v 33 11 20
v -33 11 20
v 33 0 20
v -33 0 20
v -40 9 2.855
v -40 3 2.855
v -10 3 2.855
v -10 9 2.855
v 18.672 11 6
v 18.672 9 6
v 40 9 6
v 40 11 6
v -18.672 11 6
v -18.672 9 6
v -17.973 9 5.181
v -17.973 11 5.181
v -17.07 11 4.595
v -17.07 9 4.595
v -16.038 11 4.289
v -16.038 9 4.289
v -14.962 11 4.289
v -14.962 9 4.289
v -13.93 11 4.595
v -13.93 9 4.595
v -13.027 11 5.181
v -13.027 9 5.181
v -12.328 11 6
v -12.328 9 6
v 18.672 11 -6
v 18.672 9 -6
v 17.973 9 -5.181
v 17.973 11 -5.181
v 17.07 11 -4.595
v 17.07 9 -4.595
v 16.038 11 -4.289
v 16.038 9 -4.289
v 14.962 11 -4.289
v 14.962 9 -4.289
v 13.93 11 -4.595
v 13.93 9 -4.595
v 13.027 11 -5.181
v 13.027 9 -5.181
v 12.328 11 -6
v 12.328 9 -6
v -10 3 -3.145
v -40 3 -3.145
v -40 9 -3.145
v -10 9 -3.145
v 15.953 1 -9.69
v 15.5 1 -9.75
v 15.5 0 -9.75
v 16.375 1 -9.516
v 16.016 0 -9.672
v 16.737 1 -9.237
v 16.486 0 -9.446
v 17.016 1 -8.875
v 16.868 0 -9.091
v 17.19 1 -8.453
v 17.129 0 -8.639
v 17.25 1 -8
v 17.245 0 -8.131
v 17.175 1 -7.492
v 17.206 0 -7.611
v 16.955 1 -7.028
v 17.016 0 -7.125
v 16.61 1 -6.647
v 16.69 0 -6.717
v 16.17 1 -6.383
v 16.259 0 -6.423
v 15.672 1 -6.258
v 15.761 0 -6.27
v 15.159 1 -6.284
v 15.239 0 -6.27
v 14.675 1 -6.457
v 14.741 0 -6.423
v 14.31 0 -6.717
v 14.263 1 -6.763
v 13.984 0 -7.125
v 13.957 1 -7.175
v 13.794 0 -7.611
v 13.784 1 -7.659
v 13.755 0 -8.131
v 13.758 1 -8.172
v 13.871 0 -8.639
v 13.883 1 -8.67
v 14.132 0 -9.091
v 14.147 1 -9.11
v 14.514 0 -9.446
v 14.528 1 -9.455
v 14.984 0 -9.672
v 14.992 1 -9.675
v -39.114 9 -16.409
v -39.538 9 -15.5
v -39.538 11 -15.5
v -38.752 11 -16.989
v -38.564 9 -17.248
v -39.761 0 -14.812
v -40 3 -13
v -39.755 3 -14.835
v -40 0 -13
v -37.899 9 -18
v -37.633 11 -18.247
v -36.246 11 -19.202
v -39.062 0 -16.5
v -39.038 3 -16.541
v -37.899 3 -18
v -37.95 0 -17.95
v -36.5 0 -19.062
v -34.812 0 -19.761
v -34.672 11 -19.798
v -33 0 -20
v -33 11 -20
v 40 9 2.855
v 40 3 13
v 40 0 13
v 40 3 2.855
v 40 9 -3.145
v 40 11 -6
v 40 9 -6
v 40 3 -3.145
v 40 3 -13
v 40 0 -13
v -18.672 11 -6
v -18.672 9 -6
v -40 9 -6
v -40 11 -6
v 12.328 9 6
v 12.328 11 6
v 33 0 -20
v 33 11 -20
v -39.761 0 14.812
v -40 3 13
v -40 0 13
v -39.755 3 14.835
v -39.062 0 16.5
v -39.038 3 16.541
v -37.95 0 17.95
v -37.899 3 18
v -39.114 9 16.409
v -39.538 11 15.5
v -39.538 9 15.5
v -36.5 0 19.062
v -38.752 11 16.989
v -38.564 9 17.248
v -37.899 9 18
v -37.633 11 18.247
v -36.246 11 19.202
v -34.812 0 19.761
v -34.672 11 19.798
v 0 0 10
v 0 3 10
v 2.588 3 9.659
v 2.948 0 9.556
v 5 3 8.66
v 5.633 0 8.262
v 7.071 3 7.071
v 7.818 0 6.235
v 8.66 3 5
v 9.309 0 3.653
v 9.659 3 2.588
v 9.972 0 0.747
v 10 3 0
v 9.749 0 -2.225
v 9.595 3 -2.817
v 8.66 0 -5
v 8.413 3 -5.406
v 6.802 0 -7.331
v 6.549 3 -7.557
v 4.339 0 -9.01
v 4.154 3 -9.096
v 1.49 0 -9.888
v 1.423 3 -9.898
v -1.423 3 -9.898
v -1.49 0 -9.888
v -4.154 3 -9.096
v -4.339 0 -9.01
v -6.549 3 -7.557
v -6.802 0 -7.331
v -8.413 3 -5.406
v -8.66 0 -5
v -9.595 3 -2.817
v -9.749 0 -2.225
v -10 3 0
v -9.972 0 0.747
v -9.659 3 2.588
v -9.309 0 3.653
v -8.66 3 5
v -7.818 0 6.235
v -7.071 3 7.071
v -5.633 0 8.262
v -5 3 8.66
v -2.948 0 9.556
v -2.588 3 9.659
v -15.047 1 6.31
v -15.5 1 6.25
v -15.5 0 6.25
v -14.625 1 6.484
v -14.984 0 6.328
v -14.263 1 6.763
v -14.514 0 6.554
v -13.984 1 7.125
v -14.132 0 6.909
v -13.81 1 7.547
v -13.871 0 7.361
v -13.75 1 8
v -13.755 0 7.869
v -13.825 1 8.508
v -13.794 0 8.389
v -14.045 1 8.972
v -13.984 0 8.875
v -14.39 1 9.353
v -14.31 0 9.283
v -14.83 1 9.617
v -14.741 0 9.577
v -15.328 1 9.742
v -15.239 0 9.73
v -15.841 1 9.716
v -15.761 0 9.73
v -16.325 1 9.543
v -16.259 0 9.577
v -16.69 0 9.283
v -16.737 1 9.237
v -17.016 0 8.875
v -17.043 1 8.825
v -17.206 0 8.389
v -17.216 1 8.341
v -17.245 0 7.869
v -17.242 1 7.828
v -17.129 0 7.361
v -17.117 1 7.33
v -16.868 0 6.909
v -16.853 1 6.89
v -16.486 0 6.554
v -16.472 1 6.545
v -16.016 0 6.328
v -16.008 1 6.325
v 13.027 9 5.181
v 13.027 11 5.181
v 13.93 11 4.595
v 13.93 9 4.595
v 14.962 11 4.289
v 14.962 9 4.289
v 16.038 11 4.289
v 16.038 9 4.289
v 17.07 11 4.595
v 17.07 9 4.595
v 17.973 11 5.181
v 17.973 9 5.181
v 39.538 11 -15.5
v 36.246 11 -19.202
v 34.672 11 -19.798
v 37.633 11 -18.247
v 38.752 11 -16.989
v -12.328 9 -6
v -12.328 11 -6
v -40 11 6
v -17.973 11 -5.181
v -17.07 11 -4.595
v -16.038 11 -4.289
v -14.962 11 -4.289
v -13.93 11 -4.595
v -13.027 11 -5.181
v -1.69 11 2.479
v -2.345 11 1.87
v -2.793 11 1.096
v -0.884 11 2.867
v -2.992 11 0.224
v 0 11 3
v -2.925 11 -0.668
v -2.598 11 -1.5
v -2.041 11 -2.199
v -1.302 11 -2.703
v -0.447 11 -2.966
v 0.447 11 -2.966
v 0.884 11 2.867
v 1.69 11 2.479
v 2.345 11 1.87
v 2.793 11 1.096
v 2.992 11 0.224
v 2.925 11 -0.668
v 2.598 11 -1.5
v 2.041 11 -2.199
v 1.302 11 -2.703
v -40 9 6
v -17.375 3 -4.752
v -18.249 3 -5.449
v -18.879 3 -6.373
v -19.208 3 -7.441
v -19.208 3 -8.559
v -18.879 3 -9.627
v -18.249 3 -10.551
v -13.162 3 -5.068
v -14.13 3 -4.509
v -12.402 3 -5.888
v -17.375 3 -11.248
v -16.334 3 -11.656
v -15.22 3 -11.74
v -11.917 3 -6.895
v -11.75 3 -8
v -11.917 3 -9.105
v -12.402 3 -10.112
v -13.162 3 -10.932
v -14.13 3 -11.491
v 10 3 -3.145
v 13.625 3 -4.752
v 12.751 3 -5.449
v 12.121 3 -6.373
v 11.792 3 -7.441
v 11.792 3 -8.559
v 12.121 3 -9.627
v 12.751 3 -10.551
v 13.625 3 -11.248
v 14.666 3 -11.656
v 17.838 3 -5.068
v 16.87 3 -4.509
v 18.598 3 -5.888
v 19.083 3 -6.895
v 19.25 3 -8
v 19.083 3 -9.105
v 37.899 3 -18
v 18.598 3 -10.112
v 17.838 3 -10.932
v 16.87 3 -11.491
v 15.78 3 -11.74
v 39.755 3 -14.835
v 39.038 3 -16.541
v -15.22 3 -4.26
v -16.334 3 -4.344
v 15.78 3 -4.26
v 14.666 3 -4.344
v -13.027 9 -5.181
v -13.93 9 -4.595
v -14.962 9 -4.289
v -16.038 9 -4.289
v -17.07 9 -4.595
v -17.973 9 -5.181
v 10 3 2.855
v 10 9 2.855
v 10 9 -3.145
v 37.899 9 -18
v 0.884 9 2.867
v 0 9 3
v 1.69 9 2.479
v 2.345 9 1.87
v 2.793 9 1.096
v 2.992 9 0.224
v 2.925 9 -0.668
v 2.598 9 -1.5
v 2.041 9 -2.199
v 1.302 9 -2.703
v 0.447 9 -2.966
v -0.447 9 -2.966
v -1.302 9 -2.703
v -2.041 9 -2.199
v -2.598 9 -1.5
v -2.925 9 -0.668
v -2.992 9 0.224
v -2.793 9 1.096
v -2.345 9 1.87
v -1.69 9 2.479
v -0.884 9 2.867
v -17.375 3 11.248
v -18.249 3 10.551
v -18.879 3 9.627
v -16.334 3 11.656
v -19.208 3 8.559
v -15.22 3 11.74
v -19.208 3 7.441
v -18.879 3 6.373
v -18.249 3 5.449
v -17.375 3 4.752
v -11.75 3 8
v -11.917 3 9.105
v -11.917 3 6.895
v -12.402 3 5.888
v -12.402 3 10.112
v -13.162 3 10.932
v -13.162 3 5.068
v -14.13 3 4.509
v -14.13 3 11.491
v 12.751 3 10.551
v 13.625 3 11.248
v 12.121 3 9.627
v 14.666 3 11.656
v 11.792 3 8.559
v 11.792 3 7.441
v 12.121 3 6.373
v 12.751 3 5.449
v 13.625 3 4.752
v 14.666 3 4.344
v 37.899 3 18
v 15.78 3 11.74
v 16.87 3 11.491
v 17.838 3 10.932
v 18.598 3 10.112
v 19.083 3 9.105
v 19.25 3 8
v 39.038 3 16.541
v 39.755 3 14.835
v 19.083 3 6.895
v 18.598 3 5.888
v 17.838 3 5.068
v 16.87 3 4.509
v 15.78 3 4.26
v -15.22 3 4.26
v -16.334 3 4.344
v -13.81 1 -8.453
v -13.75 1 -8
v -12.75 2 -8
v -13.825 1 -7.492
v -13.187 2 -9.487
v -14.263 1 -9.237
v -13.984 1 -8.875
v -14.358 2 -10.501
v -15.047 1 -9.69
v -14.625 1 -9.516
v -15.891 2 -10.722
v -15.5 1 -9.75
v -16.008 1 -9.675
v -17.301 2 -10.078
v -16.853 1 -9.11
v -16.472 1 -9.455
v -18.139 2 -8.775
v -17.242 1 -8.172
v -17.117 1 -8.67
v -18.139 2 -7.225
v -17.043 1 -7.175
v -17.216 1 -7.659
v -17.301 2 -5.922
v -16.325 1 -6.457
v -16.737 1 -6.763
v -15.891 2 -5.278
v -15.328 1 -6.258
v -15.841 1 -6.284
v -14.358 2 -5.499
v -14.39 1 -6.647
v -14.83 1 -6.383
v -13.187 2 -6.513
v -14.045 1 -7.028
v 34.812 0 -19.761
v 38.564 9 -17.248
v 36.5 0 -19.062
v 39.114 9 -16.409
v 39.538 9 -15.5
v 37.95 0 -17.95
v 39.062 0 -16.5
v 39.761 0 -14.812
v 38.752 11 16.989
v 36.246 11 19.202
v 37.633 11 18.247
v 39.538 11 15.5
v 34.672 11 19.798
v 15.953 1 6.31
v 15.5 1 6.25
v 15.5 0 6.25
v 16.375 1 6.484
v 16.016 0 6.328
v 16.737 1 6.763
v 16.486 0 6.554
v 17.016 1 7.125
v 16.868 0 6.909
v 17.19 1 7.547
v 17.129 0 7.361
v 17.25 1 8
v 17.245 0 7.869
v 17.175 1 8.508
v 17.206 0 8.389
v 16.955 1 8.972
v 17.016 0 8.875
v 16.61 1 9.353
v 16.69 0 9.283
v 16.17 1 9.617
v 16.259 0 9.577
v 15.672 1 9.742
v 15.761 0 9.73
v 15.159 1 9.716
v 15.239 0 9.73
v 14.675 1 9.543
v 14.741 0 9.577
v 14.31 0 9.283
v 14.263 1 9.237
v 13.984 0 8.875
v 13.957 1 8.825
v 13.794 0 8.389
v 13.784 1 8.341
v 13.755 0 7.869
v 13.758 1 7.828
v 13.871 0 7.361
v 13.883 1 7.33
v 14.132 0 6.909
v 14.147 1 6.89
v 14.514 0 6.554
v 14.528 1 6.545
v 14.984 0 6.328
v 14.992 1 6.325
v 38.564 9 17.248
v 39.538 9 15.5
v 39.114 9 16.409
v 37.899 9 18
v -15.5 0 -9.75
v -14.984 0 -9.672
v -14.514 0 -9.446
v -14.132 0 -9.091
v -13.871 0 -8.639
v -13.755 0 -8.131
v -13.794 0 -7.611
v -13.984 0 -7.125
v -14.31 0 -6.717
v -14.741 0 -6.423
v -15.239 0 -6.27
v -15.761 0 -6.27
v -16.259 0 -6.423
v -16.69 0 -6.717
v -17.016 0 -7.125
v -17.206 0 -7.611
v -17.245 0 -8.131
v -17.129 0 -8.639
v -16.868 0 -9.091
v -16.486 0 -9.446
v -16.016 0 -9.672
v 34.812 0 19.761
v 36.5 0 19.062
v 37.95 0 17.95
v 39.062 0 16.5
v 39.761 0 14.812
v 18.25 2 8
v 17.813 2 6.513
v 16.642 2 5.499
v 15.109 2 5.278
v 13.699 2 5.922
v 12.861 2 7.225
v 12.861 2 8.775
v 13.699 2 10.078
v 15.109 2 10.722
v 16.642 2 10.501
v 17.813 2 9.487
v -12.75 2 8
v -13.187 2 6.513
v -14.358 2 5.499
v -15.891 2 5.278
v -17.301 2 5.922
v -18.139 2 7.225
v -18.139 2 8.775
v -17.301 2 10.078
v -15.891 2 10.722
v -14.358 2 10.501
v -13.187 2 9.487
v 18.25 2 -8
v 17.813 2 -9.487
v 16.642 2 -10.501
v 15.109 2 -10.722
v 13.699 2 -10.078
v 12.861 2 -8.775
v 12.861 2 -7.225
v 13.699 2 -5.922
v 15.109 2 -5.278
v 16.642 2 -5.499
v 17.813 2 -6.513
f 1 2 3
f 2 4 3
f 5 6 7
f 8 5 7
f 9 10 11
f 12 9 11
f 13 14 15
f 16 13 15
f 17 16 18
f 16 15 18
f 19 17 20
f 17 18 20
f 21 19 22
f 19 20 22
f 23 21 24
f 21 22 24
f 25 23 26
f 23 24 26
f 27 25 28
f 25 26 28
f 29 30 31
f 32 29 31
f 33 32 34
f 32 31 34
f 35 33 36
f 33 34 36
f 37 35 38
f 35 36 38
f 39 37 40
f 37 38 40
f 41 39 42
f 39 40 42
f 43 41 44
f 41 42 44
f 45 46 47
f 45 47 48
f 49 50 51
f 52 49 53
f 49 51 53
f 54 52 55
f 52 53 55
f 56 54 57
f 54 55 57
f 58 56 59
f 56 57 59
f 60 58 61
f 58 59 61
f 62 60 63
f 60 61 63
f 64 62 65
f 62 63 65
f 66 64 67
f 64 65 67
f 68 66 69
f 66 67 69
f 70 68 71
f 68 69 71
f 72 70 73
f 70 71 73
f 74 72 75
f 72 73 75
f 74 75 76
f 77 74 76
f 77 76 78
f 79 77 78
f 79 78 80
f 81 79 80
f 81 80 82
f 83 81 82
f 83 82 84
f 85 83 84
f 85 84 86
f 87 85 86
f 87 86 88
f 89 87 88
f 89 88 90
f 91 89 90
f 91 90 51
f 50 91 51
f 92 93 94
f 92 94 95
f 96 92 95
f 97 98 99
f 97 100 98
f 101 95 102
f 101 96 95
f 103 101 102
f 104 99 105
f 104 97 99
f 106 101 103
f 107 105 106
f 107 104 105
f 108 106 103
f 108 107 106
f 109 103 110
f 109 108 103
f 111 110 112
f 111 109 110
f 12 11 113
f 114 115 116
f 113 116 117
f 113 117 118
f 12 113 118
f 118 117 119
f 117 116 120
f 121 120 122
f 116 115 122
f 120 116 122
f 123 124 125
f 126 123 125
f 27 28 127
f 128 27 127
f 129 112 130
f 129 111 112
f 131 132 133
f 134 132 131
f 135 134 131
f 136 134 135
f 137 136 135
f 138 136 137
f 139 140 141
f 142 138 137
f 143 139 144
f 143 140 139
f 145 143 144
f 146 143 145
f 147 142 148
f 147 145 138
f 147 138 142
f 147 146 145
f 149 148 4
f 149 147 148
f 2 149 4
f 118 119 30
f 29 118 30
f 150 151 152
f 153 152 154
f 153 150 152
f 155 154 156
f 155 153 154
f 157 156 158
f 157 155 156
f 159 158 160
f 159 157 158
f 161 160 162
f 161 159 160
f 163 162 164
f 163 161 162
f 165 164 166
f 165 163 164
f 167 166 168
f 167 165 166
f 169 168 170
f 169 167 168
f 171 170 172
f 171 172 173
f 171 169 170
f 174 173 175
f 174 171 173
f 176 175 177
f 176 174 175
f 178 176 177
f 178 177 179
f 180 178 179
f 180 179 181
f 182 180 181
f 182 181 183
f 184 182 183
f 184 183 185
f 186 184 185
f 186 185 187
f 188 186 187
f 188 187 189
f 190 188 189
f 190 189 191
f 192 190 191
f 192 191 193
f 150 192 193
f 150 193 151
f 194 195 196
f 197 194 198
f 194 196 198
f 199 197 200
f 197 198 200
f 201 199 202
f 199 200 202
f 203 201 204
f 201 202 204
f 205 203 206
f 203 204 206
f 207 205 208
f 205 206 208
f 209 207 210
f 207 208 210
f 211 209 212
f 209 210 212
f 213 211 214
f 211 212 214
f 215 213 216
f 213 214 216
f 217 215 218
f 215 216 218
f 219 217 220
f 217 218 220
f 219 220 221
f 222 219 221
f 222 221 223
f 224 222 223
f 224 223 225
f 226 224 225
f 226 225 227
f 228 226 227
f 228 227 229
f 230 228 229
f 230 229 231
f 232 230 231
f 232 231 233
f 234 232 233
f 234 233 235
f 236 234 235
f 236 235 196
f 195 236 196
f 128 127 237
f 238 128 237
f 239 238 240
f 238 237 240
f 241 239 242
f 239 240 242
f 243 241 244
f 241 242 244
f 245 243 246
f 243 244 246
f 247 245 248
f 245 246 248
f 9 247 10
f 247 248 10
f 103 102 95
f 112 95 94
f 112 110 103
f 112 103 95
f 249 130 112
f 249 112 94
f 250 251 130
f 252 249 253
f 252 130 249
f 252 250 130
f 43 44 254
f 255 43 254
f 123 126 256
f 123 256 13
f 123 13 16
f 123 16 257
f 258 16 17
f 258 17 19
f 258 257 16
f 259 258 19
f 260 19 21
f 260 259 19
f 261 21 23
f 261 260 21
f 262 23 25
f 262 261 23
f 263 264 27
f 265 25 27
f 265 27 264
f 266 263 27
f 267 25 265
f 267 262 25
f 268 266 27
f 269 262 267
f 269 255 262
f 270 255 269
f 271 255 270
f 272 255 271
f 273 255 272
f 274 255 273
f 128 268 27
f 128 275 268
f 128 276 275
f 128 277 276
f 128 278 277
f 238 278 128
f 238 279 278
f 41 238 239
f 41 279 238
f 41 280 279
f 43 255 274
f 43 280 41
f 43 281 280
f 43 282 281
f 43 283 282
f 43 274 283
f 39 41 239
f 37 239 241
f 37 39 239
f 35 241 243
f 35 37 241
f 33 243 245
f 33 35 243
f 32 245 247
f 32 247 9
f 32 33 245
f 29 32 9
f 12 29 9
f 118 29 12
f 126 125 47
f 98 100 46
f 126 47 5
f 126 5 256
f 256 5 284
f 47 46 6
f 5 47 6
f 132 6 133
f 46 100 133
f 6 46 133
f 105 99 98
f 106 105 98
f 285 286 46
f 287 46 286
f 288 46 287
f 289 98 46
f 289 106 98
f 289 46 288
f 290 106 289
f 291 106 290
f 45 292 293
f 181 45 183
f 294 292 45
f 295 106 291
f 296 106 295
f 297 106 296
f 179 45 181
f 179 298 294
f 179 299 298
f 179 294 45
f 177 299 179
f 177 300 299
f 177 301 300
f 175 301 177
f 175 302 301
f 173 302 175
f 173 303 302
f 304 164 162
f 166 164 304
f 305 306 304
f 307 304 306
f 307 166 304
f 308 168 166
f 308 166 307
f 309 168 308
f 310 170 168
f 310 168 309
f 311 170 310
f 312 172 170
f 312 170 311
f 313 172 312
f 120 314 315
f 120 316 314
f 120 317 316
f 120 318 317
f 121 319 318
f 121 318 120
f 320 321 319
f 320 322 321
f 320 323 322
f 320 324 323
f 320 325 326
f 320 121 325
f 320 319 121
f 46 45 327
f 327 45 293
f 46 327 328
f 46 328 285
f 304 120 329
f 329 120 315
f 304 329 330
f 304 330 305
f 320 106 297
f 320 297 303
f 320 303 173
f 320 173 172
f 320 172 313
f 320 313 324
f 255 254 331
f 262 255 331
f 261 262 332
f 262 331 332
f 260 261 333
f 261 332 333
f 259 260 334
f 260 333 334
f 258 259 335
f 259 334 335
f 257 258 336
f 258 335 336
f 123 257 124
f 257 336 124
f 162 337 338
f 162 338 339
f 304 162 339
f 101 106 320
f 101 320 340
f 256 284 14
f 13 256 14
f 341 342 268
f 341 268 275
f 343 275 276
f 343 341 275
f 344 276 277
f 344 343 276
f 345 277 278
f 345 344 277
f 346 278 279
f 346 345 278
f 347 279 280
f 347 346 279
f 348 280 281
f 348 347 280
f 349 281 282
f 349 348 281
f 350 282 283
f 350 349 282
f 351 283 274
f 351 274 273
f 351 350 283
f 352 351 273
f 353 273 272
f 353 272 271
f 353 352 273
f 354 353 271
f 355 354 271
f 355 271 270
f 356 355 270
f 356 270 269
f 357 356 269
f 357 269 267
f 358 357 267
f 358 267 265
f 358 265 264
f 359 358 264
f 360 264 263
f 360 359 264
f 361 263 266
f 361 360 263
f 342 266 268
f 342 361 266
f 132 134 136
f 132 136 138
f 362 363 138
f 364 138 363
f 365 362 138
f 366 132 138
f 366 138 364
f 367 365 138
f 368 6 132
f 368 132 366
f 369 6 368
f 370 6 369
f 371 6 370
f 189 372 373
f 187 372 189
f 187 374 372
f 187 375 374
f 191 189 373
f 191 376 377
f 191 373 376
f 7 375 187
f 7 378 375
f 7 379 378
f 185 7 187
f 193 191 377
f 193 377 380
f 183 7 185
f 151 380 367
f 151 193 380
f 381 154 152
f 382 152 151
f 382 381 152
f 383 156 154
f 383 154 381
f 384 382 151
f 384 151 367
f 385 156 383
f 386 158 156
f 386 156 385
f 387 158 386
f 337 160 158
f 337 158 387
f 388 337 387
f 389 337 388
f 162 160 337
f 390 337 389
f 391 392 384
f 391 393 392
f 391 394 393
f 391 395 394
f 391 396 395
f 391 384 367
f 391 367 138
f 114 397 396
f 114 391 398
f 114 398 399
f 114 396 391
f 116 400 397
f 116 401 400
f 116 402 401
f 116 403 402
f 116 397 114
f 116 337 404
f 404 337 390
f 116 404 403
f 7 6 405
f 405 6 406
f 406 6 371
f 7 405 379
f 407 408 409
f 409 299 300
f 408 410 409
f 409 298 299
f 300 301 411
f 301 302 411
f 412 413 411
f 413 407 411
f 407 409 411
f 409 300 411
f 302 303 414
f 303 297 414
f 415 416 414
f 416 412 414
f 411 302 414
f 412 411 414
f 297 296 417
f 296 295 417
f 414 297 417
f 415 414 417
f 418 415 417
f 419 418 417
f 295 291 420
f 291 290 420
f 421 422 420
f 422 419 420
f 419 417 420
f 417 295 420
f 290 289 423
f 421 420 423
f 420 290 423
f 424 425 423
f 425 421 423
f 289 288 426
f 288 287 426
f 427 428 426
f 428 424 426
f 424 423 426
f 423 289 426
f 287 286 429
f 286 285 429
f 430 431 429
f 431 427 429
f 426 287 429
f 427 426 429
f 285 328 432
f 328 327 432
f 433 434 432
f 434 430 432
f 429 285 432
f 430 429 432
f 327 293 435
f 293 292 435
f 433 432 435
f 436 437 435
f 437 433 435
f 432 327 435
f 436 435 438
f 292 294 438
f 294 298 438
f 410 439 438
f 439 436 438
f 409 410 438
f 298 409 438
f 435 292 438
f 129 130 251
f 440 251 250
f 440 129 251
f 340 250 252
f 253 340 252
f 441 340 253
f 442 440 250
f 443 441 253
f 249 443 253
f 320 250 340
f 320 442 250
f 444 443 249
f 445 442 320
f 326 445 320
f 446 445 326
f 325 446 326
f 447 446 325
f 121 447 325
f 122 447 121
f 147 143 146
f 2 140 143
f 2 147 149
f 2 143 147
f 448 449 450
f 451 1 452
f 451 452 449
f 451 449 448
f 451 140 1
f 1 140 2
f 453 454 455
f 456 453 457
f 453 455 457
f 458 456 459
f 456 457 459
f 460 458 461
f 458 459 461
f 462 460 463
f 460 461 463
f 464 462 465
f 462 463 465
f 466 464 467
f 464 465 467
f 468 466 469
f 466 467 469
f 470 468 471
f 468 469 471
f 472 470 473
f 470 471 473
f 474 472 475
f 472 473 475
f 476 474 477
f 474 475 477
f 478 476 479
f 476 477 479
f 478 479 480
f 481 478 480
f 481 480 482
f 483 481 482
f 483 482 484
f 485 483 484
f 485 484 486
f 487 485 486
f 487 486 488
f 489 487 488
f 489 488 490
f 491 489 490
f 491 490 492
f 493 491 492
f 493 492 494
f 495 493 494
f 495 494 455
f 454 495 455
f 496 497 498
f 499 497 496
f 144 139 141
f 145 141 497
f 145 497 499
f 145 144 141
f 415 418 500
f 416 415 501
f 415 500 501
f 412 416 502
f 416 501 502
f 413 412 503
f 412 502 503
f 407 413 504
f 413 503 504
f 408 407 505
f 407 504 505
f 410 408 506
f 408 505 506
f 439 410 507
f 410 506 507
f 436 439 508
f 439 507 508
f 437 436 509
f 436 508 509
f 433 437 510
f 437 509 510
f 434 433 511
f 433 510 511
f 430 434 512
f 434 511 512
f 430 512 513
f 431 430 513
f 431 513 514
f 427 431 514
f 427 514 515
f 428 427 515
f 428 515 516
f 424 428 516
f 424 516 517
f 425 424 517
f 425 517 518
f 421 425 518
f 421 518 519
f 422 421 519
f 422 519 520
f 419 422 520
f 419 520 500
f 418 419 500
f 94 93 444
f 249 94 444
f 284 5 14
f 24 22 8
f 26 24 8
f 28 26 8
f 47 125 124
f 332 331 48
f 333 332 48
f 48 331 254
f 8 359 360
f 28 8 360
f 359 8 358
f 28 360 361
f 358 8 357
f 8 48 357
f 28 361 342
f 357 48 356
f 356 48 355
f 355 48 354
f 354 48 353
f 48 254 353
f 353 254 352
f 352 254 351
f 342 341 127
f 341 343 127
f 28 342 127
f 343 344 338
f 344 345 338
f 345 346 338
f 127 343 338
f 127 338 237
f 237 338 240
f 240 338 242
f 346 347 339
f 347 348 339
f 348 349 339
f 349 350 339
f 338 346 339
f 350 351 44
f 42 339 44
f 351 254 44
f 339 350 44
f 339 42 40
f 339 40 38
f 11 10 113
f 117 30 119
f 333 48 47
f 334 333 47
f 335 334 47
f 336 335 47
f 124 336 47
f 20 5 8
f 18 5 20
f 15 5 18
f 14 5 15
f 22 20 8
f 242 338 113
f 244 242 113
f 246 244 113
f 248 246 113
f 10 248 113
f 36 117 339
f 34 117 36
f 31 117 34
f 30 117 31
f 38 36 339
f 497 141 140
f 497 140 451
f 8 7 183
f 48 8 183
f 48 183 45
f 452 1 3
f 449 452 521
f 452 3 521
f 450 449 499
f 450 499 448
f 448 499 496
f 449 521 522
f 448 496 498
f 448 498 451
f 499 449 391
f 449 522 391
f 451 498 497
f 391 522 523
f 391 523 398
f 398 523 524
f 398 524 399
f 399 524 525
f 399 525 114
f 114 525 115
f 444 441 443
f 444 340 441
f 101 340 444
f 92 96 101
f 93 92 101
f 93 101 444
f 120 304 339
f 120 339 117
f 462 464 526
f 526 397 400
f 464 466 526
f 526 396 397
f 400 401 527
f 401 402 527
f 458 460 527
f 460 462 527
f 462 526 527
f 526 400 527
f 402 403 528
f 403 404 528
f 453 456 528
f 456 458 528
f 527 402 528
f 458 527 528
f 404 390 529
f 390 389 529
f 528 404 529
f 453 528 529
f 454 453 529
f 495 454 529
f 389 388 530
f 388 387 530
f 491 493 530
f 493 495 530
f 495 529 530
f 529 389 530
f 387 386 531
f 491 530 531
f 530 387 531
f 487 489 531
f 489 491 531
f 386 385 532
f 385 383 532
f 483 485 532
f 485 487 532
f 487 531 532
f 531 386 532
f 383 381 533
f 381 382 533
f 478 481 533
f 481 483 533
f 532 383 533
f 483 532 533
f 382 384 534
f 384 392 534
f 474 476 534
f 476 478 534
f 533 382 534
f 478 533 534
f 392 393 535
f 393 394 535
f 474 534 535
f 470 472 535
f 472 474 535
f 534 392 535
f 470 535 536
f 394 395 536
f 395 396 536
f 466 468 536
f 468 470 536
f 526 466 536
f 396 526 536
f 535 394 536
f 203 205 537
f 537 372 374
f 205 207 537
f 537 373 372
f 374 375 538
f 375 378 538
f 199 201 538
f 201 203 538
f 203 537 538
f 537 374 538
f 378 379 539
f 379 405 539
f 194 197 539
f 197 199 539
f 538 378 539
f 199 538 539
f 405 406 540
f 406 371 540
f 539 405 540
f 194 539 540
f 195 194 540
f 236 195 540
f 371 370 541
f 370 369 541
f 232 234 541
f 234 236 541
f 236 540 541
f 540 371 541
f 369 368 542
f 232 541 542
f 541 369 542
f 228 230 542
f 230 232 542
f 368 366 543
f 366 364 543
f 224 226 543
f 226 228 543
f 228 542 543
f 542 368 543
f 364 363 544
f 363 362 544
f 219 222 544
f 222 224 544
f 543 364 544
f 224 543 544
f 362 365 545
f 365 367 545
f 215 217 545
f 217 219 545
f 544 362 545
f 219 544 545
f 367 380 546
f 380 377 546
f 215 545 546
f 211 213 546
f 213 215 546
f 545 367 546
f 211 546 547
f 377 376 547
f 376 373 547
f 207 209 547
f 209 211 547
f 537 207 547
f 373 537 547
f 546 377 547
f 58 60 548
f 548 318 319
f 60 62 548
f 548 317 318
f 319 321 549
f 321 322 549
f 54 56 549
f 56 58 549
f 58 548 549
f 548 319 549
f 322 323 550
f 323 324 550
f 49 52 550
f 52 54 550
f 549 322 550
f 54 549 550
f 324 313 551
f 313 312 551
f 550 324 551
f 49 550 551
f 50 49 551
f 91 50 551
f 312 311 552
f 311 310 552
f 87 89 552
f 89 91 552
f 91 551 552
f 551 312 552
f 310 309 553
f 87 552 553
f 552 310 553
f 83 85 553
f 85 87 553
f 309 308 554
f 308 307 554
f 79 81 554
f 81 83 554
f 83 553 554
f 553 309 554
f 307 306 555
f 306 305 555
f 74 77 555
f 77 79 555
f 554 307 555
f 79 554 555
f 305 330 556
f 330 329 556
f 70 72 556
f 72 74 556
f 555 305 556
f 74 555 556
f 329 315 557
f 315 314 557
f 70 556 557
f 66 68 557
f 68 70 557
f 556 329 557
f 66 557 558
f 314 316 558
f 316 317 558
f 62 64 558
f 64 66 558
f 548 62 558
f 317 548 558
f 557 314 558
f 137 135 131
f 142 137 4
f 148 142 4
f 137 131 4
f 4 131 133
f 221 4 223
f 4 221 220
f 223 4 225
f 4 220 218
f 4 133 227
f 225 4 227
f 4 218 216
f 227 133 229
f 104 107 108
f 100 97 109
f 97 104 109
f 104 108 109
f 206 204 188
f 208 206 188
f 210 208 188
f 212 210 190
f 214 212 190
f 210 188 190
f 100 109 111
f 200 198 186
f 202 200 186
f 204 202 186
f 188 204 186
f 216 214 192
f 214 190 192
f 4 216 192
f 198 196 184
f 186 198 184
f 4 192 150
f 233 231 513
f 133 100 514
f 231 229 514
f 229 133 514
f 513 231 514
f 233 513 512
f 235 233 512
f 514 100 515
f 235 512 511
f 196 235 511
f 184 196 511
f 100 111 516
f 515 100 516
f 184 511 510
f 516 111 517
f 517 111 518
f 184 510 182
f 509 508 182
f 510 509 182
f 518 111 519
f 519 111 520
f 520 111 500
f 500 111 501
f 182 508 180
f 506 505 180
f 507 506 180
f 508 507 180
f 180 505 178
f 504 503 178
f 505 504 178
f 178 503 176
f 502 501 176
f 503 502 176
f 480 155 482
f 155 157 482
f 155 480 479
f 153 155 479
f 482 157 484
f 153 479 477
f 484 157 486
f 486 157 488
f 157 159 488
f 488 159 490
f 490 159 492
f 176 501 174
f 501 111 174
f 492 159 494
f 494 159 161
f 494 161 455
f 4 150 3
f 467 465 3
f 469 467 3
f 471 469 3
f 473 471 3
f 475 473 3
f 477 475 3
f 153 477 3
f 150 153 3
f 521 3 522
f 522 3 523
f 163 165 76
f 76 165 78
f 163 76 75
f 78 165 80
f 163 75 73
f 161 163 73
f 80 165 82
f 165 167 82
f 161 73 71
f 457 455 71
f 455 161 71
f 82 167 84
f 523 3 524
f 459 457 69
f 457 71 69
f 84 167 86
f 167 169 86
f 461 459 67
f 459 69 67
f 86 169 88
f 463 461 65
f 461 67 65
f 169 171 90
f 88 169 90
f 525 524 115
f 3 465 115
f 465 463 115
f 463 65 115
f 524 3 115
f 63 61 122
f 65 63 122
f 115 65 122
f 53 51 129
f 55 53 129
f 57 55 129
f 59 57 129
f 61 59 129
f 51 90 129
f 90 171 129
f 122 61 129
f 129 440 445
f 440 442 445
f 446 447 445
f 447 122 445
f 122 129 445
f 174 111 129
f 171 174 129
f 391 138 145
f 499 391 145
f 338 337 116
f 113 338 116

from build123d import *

# Parameters (mm, degrees)
SKETCH1_W                    = 80
SKETCH1_H                    = 40
SKETCH1_R                    = 10
BOSS_EXTRUDE1_DEPTH          = 3
SKETCH2_W                    = 80
SKETCH2_H                    = 4.5
BOSS_EXTRUDE2_DEPTH          = 8
SKETCH3_W                    = 2.5
SKETCH3_H                    = 6
CUT_EXTRUDE1_DEPTH           = 80
SKETCH5_R                    = 1.75
CUT_EXTRUDE3_DEPTH           = 1
SKETCH4_R                    = 3.75
CUT_EXTRUDE4_DEPTH           = 2
CUT_EXTRUDE4_DRAFT           = -45
CUT_EXTRUDE4_PROFILE_2_DEPTH = 2
CUT_EXTRUDE4_PROFILE_2_DRAFT = -45
CUT_EXTRUDE4_PROFILE_3_DEPTH = 2
CUT_EXTRUDE4_PROFILE_3_DRAFT = -45
CUT_EXTRUDE4_PROFILE_4_DEPTH = 2
CUT_EXTRUDE4_PROFILE_4_DRAFT = -45
FILLET1_R                    = 7
SKETCH6_W                    = 30
SKETCH6_H                    = 6
BOSS_EXTRUDE3_DEPTH          = 6
SKETCH7_R                    = 3
BOSS_EXTRUDE4_DEPTH          = 2


with BuildPart() as part:
    # Sketch1 → Boss-Extrude1 (new body)
    with BuildSketch(Plane(origin=(0, 0, 0), x_dir=(1, 0, 0), z_dir=(0, 1, 0))):
        Rectangle(SKETCH1_W, SKETCH1_H)
        with Locations(Location((0, 0, 0), (0, 0, 270))):
            Circle(SKETCH1_R, mode=Mode.SUBTRACT)
    extrude(amount=BOSS_EXTRUDE1_DEPTH)

    # Sketch2 → Boss-Extrude2 (add)
    with BuildSketch(Plane(origin=(0, 3, 0), x_dir=(1, 0, 0), z_dir=(0, 1, 0))):
        with Locations((0, 17.75)):
            Rectangle(SKETCH2_W, SKETCH2_H)
        with Locations((0, -17.75)):
            Rectangle(SKETCH2_W, SKETCH2_H)
    extrude(amount=BOSS_EXTRUDE2_DEPTH)

    # Sketch3 → Cut-Extrude1 (cut)
    with BuildSketch(Plane.ZY.offset(40)):
        with Locations((-16.75, 6)):
            Rectangle(SKETCH3_W, SKETCH3_H)
        with Locations((16.75, 6)):
            Rectangle(SKETCH3_W, SKETCH3_H)
    extrude(amount=-CUT_EXTRUDE1_DEPTH, mode=Mode.SUBTRACT)

    # Sketch5 → Cut-Extrude3 (cut)
    with BuildSketch(Plane.XZ):
        with Locations(Location((-15.5, 8, 0), (0, 0, 270))):
            Circle(SKETCH5_R)
        with Locations(Location((-15.5, -8, 0), (0, 0, 270))):
            Circle(SKETCH5_R)
        with Locations(Location((15.5, 8, 0), (0, 0, 270))):
            Circle(SKETCH5_R)
        with Locations(Location((15.5, -8, 0), (0, 0, 270))):
            Circle(SKETCH5_R)
    extrude(amount=-CUT_EXTRUDE3_DEPTH, mode=Mode.SUBTRACT)


with BuildPart() as cut_extrude4_tool:
    # Sketch4 → Cut-Extrude4 (with draft: the straight prism first)
    with BuildSketch(Plane(origin=(0, 3, 0), x_dir=(1, 0, 0), z_dir=(0, 1, 0))):
        with Locations((-15.5, 8)):
            Circle(SKETCH4_R)
    extrude(amount=-CUT_EXTRUDE4_DEPTH)
    # Cut-Extrude4: the draft: its side faces are tilted about the plane it starts from
    cut_extrude4_sides = [cut_extrude4_tool.faces().sort_by_distance(p)[0] for p in [
        (-19.25, 2, -8),
    ]]
    draft(cut_extrude4_sides, Plane(origin=(0, 3, 0), x_dir=(1, 0, 0), z_dir=(0, 1, 0)), CUT_EXTRUDE4_DRAFT)


with BuildPart() as part_1:
    add(part.part)

    # Cut-Extrude4: cut by cut_extrude4_tool
    add(cut_extrude4_tool.part, mode=Mode.SUBTRACT)


with BuildPart() as cut_extrude4_profile_2_tool:
    # Sketch4 → Cut-Extrude4 profile 2 (with draft: the straight prism first)
    with BuildSketch(Plane(origin=(0, 3, 0), x_dir=(1, 0, 0), z_dir=(0, 1, 0))):
        with Locations((-15.5, -8)):
            Circle(SKETCH4_R)
    extrude(amount=-CUT_EXTRUDE4_PROFILE_2_DEPTH)
    # Cut-Extrude4 profile 2: the draft: its side faces are tilted about the plane it starts from
    cut_extrude4_profile_2_sides = [cut_extrude4_profile_2_tool.faces().sort_by_distance(p)[0] for p in [
        (-19.25, 2, 8),
    ]]
    draft(cut_extrude4_profile_2_sides, Plane(origin=(0, 3, 0), x_dir=(1, 0, 0), z_dir=(0, 1, 0)), CUT_EXTRUDE4_PROFILE_2_DRAFT)


with BuildPart() as part_2:
    add(part_1.part)

    # Cut-Extrude4 profile 2: cut by cut_extrude4_profile_2_tool
    add(cut_extrude4_profile_2_tool.part, mode=Mode.SUBTRACT)


with BuildPart() as cut_extrude4_profile_3_tool:
    # Sketch4 → Cut-Extrude4 profile 3 (with draft: the straight prism first)
    with BuildSketch(Plane(origin=(0, 3, 0), x_dir=(1, 0, 0), z_dir=(0, 1, 0))):
        with Locations((15.5, -8)):
            Circle(SKETCH4_R)
    extrude(amount=-CUT_EXTRUDE4_PROFILE_3_DEPTH)
    # Cut-Extrude4 profile 3: the draft: its side faces are tilted about the plane it starts from
    cut_extrude4_profile_3_sides = [cut_extrude4_profile_3_tool.faces().sort_by_distance(p)[0] for p in [
        (11.75, 2, 8),
    ]]
    draft(cut_extrude4_profile_3_sides, Plane(origin=(0, 3, 0), x_dir=(1, 0, 0), z_dir=(0, 1, 0)), CUT_EXTRUDE4_PROFILE_3_DRAFT)


with BuildPart() as part_3:
    add(part_2.part)

    # Cut-Extrude4 profile 3: cut by cut_extrude4_profile_3_tool
    add(cut_extrude4_profile_3_tool.part, mode=Mode.SUBTRACT)


with BuildPart() as cut_extrude4_profile_4_tool:
    # Sketch4 → Cut-Extrude4 profile 4 (with draft: the straight prism first)
    with BuildSketch(Plane(origin=(0, 3, 0), x_dir=(1, 0, 0), z_dir=(0, 1, 0))):
        with Locations((15.5, 8)):
            Circle(SKETCH4_R)
    extrude(amount=-CUT_EXTRUDE4_PROFILE_4_DEPTH)
    # Cut-Extrude4 profile 4: the draft: its side faces are tilted about the plane it starts from
    cut_extrude4_profile_4_sides = [cut_extrude4_profile_4_tool.faces().sort_by_distance(p)[0] for p in [
        (11.75, 2, -8),
    ]]
    draft(cut_extrude4_profile_4_sides, Plane(origin=(0, 3, 0), x_dir=(1, 0, 0), z_dir=(0, 1, 0)), CUT_EXTRUDE4_PROFILE_4_DRAFT)


with BuildPart() as part_4:
    add(part_3.part)

    # Cut-Extrude4 profile 4: cut by cut_extrude4_profile_4_tool
    add(cut_extrude4_profile_4_tool.part, mode=Mode.SUBTRACT)

    # Fillet1
    fillet1_edges = [part_4.edges().sort_by_distance(p)[0] for p in [
        (40, 5.5, 20),
        (40, 5.5, -20),
        (-40, 5.5, 20),
        (-40, 5.5, -20),
    ]]
    fillet(fillet1_edges, radius=FILLET1_R)

    # Sketch6 → Boss-Extrude3 (add)
    with BuildSketch(Plane(origin=(0, 3, 0), x_dir=(1, 0, 0), z_dir=(0, 1, 0))):
        with Locations((-25, 0.145287111)):
            Rectangle(SKETCH6_W, SKETCH6_H)
        with Locations((25, 0.145287111)):
            Rectangle(SKETCH6_W, SKETCH6_H)
    extrude(amount=BOSS_EXTRUDE3_DEPTH)

    # Sketch7 → Boss-Extrude4 (add)
    with BuildSketch(Plane(origin=(0, 9, 0), x_dir=(1, 0, 0), z_dir=(0, 1, 0))):
        with BuildLine():
            Line((40, 6), (18.672144385, 6))
            ThreePointArc((18.672144385, 6), (15.5, 4.25), (12.327855615, 6))
            Line((12.327855615, 6), (-12.327855615, 6))
            ThreePointArc((-12.327855615, 6), (-15.5, 4.25), (-18.672144385, 6))
            Line((-18.672144385, 6), (-40, 6))
            Line((-40, 6), (-40, -6))
            Line((-40, -6), (-18.672144385, -6))
            ThreePointArc((-18.672144385, -6), (-15.5, -4.25), (-12.327855615, -6))
            Line((-12.327855615, -6), (12.327855615, -6))
            ThreePointArc((12.327855615, -6), (15.5, -4.25), (18.672144385, -6))
            Line((18.672144385, -6), (40, -6))
            Line((40, -6), (40, 6))
        make_face()
        with Locations(Location((0, 0, 0), (0, 0, 270))):
            Circle(SKETCH7_R, mode=Mode.SUBTRACT)
    extrude(amount=BOSS_EXTRUDE4_DEPTH)


solid = part_4.part
